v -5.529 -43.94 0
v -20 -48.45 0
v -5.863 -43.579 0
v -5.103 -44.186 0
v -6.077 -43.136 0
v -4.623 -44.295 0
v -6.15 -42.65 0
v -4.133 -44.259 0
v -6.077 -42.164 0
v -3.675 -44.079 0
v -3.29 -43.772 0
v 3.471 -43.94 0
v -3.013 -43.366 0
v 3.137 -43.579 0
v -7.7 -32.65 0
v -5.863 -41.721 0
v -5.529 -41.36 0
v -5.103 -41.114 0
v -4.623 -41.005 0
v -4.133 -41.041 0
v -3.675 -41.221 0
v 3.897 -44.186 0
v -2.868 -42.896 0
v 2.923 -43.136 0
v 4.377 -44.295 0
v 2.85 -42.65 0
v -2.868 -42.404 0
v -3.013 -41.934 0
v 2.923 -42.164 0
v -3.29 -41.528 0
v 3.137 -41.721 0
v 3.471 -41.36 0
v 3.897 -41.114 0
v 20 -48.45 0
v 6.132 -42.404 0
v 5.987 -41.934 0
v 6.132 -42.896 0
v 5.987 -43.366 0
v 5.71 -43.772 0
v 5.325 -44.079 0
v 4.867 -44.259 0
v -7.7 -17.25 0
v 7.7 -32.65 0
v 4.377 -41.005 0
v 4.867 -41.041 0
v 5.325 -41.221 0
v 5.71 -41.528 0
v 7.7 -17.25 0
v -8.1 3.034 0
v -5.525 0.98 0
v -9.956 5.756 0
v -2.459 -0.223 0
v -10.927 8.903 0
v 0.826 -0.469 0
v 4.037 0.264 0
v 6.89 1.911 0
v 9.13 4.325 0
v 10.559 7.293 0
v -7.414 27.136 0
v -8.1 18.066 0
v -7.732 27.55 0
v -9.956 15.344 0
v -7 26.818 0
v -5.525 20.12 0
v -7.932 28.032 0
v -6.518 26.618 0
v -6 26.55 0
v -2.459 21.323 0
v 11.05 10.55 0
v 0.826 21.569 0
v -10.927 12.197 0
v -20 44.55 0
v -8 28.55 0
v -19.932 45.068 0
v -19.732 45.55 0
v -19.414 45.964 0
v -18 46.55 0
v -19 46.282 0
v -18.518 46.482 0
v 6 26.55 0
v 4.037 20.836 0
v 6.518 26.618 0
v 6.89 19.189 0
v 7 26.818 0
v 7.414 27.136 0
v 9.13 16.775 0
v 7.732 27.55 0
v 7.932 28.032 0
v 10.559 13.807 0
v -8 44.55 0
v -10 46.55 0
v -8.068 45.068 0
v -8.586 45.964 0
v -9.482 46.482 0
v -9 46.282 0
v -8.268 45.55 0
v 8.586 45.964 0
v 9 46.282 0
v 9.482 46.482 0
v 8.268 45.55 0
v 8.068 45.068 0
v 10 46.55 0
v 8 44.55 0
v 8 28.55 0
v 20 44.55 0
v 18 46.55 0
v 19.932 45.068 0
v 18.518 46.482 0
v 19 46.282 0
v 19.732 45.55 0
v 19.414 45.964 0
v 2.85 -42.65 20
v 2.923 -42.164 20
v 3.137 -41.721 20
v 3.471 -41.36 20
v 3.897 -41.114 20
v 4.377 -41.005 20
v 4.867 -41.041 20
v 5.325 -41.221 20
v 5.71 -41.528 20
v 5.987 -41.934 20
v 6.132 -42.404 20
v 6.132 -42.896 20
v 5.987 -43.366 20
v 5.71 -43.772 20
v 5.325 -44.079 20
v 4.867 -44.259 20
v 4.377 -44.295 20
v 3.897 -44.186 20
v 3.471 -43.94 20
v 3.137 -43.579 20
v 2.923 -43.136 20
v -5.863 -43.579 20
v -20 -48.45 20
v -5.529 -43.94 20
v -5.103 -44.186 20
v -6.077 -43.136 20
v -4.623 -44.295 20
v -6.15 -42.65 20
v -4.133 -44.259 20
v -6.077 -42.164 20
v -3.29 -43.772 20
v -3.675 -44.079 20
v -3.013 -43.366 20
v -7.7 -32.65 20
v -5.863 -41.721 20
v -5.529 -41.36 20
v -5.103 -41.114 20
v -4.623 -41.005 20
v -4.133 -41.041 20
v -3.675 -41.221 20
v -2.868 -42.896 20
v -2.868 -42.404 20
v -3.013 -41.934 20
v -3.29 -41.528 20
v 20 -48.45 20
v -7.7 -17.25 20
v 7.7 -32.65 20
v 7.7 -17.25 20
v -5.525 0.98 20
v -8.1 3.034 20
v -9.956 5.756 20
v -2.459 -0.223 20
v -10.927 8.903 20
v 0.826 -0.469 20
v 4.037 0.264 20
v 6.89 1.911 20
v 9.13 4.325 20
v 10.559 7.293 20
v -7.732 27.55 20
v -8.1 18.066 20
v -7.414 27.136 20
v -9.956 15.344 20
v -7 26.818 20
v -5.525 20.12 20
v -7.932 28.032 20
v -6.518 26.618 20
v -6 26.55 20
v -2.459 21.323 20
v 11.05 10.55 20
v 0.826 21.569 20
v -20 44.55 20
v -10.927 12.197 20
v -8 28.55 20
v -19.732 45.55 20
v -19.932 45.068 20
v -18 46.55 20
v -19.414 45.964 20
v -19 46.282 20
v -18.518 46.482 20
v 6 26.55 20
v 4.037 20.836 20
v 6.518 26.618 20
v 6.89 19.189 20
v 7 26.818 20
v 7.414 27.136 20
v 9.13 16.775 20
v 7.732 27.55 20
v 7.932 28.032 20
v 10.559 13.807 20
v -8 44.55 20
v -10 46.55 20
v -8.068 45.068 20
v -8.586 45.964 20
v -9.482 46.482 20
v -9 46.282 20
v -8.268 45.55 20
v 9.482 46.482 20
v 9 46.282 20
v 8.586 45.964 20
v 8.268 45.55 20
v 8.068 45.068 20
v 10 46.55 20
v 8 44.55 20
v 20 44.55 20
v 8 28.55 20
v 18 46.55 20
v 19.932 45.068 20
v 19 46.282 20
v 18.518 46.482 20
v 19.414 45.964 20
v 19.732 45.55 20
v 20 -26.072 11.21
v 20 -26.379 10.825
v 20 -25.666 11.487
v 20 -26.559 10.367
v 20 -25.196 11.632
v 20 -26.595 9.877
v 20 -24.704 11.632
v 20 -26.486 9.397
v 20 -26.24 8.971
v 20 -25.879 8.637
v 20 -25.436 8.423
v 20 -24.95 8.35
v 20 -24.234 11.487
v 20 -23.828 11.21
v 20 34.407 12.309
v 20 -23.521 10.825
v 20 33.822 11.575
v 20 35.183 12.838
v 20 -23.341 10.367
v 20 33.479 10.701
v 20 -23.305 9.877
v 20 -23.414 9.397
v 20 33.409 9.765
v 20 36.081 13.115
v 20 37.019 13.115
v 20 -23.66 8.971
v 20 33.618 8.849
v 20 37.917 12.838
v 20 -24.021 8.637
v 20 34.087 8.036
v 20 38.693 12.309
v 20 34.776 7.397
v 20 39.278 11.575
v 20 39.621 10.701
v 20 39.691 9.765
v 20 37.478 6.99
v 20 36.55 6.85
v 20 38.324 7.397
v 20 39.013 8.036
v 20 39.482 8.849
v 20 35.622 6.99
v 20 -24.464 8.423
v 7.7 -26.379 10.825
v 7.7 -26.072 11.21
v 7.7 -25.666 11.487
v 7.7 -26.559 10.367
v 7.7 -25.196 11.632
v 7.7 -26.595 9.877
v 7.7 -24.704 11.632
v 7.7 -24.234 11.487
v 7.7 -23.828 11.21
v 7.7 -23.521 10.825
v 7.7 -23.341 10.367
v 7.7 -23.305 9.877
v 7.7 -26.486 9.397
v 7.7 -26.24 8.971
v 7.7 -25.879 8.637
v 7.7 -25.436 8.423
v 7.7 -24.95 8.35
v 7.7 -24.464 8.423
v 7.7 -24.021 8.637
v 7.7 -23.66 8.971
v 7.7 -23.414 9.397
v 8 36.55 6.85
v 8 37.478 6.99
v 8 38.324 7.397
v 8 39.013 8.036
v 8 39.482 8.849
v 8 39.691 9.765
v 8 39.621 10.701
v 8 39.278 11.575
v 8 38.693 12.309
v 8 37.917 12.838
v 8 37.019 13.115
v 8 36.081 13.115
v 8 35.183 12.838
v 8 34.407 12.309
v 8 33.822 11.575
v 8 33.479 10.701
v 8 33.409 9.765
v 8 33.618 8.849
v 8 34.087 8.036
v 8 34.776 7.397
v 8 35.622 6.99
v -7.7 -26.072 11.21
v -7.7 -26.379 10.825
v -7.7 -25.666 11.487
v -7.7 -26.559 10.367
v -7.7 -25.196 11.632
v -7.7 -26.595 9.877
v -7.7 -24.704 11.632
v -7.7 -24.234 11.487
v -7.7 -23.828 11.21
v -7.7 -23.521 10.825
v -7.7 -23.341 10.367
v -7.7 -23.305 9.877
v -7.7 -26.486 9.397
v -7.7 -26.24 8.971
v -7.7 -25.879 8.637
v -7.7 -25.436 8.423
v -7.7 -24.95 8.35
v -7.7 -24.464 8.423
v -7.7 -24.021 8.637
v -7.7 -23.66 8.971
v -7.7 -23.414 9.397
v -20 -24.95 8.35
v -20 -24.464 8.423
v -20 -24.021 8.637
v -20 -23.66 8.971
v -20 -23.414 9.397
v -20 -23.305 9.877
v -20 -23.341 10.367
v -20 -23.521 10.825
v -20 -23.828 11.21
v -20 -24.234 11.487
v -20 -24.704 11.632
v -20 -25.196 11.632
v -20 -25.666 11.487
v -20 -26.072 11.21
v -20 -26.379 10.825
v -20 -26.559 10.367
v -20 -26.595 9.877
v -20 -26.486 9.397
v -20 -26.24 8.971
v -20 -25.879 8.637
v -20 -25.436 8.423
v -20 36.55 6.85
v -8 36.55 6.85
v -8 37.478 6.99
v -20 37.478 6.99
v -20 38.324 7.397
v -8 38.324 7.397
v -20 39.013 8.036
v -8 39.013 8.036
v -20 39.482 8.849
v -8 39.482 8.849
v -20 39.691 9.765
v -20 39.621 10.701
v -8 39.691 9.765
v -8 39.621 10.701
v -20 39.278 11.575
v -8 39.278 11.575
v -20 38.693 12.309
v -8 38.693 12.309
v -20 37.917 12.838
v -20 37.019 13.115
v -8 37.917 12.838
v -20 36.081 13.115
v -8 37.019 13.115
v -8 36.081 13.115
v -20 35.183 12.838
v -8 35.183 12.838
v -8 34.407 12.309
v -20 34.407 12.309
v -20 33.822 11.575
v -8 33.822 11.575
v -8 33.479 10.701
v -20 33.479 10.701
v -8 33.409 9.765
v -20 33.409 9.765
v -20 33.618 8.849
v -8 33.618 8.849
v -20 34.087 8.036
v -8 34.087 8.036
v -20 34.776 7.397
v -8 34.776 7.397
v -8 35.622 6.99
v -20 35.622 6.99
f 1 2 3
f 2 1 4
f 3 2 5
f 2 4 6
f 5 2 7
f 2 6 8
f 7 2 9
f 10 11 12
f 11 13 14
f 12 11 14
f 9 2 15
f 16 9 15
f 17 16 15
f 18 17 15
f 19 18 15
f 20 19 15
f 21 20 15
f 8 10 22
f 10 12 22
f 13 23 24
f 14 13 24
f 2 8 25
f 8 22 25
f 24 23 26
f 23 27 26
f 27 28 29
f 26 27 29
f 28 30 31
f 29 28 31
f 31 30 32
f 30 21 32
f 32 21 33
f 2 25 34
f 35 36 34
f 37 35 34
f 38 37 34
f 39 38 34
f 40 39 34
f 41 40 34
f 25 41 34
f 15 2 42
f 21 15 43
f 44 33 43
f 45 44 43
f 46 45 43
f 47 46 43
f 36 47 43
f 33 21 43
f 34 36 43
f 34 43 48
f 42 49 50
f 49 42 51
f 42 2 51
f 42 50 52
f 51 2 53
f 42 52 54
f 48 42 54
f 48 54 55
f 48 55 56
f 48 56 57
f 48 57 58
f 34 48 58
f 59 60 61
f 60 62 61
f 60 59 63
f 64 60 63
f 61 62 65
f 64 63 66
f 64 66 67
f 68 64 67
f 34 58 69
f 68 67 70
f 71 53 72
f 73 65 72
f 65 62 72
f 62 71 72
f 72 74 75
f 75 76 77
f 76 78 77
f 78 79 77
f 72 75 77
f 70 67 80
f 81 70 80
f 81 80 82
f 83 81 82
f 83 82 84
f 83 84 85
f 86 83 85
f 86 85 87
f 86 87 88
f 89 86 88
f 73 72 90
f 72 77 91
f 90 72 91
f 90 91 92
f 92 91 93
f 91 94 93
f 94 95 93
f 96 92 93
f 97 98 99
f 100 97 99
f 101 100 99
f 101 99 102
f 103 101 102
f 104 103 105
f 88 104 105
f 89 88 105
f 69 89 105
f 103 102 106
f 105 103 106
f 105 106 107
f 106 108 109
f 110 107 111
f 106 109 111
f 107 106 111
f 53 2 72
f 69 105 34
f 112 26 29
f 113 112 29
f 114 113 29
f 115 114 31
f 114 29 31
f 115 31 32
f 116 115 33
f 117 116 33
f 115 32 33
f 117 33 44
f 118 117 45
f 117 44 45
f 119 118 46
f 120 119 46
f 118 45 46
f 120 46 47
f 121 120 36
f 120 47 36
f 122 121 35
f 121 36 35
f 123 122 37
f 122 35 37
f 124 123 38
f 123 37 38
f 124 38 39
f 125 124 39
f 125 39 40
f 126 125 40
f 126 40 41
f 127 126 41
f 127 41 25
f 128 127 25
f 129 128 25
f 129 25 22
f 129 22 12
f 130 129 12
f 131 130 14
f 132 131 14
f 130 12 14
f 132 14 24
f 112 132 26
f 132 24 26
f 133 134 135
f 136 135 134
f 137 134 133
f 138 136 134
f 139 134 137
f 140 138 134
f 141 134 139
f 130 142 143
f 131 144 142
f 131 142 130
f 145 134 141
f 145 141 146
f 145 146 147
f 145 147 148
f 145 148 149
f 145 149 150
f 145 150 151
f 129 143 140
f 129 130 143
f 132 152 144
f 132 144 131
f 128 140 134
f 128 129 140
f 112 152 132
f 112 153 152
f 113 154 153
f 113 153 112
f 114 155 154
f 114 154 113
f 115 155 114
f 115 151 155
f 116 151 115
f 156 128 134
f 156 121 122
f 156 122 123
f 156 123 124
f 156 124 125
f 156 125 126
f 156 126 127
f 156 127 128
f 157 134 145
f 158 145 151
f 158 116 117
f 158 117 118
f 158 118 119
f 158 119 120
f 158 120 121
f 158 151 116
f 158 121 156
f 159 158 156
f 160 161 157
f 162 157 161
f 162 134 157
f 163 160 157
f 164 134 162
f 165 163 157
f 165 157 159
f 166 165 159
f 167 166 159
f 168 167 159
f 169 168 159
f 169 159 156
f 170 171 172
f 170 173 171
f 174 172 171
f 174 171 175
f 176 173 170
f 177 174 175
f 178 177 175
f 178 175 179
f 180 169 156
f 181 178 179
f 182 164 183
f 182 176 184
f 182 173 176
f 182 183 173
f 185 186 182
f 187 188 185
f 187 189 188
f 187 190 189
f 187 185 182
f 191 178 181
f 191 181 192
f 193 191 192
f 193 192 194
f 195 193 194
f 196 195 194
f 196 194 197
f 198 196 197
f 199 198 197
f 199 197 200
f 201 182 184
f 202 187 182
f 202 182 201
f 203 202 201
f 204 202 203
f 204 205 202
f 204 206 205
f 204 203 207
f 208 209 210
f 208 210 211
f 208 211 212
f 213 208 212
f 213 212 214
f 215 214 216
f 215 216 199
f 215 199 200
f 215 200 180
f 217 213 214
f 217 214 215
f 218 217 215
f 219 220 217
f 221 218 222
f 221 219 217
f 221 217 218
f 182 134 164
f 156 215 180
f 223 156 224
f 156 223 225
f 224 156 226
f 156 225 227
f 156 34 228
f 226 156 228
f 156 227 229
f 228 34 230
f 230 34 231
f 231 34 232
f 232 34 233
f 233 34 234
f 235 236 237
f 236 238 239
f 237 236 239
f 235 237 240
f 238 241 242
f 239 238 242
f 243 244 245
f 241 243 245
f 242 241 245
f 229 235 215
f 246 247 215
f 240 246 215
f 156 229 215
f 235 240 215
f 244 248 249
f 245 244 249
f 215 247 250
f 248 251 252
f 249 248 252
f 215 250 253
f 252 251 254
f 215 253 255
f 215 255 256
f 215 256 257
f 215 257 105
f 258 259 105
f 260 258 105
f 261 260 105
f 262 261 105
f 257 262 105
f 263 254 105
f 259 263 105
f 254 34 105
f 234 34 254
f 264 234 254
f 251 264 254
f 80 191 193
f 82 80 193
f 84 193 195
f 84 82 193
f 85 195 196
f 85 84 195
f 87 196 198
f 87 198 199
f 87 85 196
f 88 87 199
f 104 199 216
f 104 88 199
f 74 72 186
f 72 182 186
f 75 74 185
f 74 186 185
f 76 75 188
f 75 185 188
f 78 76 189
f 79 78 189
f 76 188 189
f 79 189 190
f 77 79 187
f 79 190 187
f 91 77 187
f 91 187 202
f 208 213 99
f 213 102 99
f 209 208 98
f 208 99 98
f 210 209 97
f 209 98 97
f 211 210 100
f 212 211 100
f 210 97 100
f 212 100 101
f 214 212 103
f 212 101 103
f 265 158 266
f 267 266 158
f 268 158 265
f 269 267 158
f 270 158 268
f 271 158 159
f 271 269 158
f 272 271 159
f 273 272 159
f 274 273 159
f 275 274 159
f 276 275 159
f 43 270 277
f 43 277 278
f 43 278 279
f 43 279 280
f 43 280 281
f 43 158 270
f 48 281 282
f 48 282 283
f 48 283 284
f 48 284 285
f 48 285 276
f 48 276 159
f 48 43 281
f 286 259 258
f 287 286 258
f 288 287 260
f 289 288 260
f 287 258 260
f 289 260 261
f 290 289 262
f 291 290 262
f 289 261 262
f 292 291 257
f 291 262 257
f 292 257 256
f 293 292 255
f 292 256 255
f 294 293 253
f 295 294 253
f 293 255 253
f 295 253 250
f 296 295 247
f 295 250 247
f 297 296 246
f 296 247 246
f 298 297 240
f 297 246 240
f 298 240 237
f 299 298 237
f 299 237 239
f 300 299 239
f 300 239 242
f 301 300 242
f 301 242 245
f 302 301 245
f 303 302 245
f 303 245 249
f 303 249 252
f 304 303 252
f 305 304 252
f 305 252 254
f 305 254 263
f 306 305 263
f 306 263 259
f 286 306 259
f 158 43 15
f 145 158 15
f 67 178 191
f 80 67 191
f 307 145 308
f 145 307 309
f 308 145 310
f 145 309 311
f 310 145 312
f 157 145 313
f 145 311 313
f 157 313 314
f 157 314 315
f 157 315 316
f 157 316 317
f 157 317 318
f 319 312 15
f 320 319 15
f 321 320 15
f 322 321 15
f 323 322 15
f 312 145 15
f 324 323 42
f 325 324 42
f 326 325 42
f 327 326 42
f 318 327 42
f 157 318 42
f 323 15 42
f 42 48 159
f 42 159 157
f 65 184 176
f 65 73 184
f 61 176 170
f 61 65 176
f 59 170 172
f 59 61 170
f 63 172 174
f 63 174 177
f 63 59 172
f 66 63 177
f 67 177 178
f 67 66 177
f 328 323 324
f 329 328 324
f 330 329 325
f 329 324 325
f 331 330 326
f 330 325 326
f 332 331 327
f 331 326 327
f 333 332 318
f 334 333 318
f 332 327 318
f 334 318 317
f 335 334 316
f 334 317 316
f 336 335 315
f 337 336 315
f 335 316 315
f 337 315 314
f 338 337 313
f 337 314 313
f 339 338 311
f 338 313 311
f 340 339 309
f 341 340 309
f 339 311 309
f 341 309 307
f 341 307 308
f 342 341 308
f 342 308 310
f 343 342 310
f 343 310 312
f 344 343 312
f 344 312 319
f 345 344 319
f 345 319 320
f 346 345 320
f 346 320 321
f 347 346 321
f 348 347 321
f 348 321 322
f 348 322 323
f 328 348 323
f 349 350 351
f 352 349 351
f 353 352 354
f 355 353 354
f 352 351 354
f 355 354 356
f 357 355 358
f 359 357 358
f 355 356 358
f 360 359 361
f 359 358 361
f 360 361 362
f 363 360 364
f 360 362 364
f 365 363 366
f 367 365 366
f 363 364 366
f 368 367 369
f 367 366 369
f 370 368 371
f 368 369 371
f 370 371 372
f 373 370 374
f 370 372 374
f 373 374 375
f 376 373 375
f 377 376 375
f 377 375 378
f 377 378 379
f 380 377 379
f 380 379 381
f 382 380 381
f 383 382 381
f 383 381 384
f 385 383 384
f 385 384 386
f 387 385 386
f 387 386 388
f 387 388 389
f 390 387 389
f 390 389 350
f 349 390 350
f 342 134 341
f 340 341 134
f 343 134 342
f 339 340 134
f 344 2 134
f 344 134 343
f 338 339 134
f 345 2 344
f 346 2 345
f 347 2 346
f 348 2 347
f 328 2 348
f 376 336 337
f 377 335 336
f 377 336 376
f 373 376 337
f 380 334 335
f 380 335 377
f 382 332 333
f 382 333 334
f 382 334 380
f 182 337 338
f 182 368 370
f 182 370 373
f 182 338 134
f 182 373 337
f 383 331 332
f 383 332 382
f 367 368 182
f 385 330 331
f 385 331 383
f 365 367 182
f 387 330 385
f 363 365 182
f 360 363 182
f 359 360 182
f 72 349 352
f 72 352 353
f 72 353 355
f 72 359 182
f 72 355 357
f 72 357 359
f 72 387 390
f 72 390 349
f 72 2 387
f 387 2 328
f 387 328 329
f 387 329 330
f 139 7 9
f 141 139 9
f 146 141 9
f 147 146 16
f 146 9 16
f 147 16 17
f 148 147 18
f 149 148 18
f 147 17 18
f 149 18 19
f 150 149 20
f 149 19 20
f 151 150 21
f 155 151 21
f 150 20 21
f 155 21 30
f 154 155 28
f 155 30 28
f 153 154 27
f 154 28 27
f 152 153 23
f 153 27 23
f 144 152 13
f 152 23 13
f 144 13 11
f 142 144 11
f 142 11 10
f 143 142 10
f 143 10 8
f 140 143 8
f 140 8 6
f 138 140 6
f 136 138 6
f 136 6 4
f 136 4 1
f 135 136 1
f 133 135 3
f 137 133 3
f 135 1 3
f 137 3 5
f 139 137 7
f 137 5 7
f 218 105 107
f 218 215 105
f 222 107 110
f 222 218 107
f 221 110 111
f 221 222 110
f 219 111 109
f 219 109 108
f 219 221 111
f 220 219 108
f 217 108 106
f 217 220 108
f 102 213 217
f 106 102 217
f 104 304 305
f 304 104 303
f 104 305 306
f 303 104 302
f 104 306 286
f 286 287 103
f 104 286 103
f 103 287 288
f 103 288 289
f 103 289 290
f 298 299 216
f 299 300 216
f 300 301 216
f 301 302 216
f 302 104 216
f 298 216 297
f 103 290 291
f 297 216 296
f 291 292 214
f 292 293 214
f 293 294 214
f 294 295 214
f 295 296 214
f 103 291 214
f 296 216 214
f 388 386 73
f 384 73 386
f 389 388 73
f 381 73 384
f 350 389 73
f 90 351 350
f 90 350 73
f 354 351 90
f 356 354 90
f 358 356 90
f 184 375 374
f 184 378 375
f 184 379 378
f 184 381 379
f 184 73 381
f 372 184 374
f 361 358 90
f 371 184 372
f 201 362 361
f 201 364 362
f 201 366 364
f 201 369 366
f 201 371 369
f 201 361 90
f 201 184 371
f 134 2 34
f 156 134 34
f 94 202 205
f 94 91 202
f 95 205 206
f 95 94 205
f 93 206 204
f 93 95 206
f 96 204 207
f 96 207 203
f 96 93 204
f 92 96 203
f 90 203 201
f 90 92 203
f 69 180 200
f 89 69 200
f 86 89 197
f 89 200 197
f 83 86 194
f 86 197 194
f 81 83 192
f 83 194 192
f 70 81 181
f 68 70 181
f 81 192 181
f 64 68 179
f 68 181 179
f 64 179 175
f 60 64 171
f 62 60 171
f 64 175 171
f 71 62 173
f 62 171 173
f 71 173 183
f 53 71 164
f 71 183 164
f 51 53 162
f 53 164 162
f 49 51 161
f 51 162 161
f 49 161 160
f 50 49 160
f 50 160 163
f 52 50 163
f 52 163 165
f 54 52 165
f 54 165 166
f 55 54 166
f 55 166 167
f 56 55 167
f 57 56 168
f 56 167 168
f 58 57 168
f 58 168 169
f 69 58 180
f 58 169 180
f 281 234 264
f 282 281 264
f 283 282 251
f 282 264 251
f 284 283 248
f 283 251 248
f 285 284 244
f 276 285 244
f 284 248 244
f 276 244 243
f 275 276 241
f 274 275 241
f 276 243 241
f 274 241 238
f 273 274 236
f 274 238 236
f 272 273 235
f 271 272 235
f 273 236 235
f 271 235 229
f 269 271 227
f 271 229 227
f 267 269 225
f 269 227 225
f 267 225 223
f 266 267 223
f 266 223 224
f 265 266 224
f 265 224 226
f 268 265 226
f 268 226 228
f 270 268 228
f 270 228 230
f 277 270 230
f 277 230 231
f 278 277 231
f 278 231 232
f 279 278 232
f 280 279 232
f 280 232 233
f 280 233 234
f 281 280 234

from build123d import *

# Parameters (mm, degrees)
SKETCH_1_W          = 40
SKETCH_1_H          = 95
EXTRUDE_1_DEPTH     = 20
SKETCH_2_R          = 3.15
CUT_EXTRUDE_1_DEPTH = 500
SKETCH_4_W          = 16
SKETCH_4_H          = 24.328759663
CUT_EXTRUDE_2_DEPTH = 500
SKETCH_5_R          = 11.05
CUT_EXTRUDE_3_DEPTH = 20
SKETCH_6_W          = 15.4
SKETCH_6_H          = 15.4
CUT_EXTRUDE_4_DEPTH = 20
SKETCH_7_R          = 1.65
CUT_EXTRUDE_5_DEPTH = 20
SKETCH_8_R          = 1.65
CUT_EXTRUDE_6_DEPTH = 50
FILLET_1_R          = 2


with BuildPart() as part:
    # 草图1 → 凸台-拉伸1 (new body)
    with BuildSketch(Plane.XY):
        with Locations((0, -0.95)):
            Rectangle(SKETCH_1_W, SKETCH_1_H)
    extrude(amount=EXTRUDE_1_DEPTH)

    # 草图2 → 切除-拉伸1 (cut)
    with BuildSketch(Plane(origin=(20, 0, 0), x_dir=(0, 0, -1), z_dir=(1, 0, 0))):
        with Locations((-10, 36.55)):
            Circle(SKETCH_2_R)
    extrude(amount=-CUT_EXTRUDE_1_DEPTH, mode=Mode.SUBTRACT)

    # 草图4 → 切除-拉伸2 (cut)
    with BuildSketch(Plane.XY.offset(20)):
        with Locations((0, 38.714379832)):
            Rectangle(SKETCH_4_W, SKETCH_4_H)
    extrude(amount=-CUT_EXTRUDE_2_DEPTH, mode=Mode.SUBTRACT)

    # 草图5 → 切除-拉伸3 (cut)
    with BuildSketch(Plane.XY.offset(20)):
        with Locations((0, 10.55)):
            Circle(SKETCH_5_R)
    extrude(amount=-CUT_EXTRUDE_3_DEPTH, mode=Mode.SUBTRACT)

    # 草图6 → 切除-拉伸4 (cut)
    with BuildSketch(Plane(origin=(0, 0, 0), x_dir=(-1, 0, 0), z_dir=(0, 0, -1))):
        with Locations((0, -24.95)):
            Rectangle(SKETCH_6_W, SKETCH_6_H)
    extrude(amount=-CUT_EXTRUDE_4_DEPTH, mode=Mode.SUBTRACT)

    # 草图7 → 切除-拉伸5 (cut)
    with BuildSketch(Plane(origin=(0, 0, 0), x_dir=(-1, 0, 0), z_dir=(0, 0, -1))):
        with Locations((4.5, -42.65)):
            Circle(SKETCH_7_R)
        with Locations((-4.5, -42.65)):
            Circle(SKETCH_7_R)
    extrude(amount=-CUT_EXTRUDE_5_DEPTH, mode=Mode.SUBTRACT)

    # 草图8 → 切除-拉伸6 (cut)
    with BuildSketch(Plane(origin=(20, 0, 0), x_dir=(0, 0, -1), z_dir=(1, 0, 0))):
        with Locations((-10, -24.95)):
            Circle(SKETCH_8_R)
    extrude(amount=-CUT_EXTRUDE_6_DEPTH, mode=Mode.SUBTRACT)

    # 圆角1
    fillet_1_edges = [part.edges().sort_by_distance(p)[0] for p in [
        (8, 46.55, 10),
        (-8, 46.55, 10),
        (-8, 26.55, 10),
        (8, 26.55, 10),
        (-20, 46.55, 10),
        (20, 46.55, 10),
    ]]
    fillet(fillet_1_edges, radius=FILLET_1_R)


solid = part.part
